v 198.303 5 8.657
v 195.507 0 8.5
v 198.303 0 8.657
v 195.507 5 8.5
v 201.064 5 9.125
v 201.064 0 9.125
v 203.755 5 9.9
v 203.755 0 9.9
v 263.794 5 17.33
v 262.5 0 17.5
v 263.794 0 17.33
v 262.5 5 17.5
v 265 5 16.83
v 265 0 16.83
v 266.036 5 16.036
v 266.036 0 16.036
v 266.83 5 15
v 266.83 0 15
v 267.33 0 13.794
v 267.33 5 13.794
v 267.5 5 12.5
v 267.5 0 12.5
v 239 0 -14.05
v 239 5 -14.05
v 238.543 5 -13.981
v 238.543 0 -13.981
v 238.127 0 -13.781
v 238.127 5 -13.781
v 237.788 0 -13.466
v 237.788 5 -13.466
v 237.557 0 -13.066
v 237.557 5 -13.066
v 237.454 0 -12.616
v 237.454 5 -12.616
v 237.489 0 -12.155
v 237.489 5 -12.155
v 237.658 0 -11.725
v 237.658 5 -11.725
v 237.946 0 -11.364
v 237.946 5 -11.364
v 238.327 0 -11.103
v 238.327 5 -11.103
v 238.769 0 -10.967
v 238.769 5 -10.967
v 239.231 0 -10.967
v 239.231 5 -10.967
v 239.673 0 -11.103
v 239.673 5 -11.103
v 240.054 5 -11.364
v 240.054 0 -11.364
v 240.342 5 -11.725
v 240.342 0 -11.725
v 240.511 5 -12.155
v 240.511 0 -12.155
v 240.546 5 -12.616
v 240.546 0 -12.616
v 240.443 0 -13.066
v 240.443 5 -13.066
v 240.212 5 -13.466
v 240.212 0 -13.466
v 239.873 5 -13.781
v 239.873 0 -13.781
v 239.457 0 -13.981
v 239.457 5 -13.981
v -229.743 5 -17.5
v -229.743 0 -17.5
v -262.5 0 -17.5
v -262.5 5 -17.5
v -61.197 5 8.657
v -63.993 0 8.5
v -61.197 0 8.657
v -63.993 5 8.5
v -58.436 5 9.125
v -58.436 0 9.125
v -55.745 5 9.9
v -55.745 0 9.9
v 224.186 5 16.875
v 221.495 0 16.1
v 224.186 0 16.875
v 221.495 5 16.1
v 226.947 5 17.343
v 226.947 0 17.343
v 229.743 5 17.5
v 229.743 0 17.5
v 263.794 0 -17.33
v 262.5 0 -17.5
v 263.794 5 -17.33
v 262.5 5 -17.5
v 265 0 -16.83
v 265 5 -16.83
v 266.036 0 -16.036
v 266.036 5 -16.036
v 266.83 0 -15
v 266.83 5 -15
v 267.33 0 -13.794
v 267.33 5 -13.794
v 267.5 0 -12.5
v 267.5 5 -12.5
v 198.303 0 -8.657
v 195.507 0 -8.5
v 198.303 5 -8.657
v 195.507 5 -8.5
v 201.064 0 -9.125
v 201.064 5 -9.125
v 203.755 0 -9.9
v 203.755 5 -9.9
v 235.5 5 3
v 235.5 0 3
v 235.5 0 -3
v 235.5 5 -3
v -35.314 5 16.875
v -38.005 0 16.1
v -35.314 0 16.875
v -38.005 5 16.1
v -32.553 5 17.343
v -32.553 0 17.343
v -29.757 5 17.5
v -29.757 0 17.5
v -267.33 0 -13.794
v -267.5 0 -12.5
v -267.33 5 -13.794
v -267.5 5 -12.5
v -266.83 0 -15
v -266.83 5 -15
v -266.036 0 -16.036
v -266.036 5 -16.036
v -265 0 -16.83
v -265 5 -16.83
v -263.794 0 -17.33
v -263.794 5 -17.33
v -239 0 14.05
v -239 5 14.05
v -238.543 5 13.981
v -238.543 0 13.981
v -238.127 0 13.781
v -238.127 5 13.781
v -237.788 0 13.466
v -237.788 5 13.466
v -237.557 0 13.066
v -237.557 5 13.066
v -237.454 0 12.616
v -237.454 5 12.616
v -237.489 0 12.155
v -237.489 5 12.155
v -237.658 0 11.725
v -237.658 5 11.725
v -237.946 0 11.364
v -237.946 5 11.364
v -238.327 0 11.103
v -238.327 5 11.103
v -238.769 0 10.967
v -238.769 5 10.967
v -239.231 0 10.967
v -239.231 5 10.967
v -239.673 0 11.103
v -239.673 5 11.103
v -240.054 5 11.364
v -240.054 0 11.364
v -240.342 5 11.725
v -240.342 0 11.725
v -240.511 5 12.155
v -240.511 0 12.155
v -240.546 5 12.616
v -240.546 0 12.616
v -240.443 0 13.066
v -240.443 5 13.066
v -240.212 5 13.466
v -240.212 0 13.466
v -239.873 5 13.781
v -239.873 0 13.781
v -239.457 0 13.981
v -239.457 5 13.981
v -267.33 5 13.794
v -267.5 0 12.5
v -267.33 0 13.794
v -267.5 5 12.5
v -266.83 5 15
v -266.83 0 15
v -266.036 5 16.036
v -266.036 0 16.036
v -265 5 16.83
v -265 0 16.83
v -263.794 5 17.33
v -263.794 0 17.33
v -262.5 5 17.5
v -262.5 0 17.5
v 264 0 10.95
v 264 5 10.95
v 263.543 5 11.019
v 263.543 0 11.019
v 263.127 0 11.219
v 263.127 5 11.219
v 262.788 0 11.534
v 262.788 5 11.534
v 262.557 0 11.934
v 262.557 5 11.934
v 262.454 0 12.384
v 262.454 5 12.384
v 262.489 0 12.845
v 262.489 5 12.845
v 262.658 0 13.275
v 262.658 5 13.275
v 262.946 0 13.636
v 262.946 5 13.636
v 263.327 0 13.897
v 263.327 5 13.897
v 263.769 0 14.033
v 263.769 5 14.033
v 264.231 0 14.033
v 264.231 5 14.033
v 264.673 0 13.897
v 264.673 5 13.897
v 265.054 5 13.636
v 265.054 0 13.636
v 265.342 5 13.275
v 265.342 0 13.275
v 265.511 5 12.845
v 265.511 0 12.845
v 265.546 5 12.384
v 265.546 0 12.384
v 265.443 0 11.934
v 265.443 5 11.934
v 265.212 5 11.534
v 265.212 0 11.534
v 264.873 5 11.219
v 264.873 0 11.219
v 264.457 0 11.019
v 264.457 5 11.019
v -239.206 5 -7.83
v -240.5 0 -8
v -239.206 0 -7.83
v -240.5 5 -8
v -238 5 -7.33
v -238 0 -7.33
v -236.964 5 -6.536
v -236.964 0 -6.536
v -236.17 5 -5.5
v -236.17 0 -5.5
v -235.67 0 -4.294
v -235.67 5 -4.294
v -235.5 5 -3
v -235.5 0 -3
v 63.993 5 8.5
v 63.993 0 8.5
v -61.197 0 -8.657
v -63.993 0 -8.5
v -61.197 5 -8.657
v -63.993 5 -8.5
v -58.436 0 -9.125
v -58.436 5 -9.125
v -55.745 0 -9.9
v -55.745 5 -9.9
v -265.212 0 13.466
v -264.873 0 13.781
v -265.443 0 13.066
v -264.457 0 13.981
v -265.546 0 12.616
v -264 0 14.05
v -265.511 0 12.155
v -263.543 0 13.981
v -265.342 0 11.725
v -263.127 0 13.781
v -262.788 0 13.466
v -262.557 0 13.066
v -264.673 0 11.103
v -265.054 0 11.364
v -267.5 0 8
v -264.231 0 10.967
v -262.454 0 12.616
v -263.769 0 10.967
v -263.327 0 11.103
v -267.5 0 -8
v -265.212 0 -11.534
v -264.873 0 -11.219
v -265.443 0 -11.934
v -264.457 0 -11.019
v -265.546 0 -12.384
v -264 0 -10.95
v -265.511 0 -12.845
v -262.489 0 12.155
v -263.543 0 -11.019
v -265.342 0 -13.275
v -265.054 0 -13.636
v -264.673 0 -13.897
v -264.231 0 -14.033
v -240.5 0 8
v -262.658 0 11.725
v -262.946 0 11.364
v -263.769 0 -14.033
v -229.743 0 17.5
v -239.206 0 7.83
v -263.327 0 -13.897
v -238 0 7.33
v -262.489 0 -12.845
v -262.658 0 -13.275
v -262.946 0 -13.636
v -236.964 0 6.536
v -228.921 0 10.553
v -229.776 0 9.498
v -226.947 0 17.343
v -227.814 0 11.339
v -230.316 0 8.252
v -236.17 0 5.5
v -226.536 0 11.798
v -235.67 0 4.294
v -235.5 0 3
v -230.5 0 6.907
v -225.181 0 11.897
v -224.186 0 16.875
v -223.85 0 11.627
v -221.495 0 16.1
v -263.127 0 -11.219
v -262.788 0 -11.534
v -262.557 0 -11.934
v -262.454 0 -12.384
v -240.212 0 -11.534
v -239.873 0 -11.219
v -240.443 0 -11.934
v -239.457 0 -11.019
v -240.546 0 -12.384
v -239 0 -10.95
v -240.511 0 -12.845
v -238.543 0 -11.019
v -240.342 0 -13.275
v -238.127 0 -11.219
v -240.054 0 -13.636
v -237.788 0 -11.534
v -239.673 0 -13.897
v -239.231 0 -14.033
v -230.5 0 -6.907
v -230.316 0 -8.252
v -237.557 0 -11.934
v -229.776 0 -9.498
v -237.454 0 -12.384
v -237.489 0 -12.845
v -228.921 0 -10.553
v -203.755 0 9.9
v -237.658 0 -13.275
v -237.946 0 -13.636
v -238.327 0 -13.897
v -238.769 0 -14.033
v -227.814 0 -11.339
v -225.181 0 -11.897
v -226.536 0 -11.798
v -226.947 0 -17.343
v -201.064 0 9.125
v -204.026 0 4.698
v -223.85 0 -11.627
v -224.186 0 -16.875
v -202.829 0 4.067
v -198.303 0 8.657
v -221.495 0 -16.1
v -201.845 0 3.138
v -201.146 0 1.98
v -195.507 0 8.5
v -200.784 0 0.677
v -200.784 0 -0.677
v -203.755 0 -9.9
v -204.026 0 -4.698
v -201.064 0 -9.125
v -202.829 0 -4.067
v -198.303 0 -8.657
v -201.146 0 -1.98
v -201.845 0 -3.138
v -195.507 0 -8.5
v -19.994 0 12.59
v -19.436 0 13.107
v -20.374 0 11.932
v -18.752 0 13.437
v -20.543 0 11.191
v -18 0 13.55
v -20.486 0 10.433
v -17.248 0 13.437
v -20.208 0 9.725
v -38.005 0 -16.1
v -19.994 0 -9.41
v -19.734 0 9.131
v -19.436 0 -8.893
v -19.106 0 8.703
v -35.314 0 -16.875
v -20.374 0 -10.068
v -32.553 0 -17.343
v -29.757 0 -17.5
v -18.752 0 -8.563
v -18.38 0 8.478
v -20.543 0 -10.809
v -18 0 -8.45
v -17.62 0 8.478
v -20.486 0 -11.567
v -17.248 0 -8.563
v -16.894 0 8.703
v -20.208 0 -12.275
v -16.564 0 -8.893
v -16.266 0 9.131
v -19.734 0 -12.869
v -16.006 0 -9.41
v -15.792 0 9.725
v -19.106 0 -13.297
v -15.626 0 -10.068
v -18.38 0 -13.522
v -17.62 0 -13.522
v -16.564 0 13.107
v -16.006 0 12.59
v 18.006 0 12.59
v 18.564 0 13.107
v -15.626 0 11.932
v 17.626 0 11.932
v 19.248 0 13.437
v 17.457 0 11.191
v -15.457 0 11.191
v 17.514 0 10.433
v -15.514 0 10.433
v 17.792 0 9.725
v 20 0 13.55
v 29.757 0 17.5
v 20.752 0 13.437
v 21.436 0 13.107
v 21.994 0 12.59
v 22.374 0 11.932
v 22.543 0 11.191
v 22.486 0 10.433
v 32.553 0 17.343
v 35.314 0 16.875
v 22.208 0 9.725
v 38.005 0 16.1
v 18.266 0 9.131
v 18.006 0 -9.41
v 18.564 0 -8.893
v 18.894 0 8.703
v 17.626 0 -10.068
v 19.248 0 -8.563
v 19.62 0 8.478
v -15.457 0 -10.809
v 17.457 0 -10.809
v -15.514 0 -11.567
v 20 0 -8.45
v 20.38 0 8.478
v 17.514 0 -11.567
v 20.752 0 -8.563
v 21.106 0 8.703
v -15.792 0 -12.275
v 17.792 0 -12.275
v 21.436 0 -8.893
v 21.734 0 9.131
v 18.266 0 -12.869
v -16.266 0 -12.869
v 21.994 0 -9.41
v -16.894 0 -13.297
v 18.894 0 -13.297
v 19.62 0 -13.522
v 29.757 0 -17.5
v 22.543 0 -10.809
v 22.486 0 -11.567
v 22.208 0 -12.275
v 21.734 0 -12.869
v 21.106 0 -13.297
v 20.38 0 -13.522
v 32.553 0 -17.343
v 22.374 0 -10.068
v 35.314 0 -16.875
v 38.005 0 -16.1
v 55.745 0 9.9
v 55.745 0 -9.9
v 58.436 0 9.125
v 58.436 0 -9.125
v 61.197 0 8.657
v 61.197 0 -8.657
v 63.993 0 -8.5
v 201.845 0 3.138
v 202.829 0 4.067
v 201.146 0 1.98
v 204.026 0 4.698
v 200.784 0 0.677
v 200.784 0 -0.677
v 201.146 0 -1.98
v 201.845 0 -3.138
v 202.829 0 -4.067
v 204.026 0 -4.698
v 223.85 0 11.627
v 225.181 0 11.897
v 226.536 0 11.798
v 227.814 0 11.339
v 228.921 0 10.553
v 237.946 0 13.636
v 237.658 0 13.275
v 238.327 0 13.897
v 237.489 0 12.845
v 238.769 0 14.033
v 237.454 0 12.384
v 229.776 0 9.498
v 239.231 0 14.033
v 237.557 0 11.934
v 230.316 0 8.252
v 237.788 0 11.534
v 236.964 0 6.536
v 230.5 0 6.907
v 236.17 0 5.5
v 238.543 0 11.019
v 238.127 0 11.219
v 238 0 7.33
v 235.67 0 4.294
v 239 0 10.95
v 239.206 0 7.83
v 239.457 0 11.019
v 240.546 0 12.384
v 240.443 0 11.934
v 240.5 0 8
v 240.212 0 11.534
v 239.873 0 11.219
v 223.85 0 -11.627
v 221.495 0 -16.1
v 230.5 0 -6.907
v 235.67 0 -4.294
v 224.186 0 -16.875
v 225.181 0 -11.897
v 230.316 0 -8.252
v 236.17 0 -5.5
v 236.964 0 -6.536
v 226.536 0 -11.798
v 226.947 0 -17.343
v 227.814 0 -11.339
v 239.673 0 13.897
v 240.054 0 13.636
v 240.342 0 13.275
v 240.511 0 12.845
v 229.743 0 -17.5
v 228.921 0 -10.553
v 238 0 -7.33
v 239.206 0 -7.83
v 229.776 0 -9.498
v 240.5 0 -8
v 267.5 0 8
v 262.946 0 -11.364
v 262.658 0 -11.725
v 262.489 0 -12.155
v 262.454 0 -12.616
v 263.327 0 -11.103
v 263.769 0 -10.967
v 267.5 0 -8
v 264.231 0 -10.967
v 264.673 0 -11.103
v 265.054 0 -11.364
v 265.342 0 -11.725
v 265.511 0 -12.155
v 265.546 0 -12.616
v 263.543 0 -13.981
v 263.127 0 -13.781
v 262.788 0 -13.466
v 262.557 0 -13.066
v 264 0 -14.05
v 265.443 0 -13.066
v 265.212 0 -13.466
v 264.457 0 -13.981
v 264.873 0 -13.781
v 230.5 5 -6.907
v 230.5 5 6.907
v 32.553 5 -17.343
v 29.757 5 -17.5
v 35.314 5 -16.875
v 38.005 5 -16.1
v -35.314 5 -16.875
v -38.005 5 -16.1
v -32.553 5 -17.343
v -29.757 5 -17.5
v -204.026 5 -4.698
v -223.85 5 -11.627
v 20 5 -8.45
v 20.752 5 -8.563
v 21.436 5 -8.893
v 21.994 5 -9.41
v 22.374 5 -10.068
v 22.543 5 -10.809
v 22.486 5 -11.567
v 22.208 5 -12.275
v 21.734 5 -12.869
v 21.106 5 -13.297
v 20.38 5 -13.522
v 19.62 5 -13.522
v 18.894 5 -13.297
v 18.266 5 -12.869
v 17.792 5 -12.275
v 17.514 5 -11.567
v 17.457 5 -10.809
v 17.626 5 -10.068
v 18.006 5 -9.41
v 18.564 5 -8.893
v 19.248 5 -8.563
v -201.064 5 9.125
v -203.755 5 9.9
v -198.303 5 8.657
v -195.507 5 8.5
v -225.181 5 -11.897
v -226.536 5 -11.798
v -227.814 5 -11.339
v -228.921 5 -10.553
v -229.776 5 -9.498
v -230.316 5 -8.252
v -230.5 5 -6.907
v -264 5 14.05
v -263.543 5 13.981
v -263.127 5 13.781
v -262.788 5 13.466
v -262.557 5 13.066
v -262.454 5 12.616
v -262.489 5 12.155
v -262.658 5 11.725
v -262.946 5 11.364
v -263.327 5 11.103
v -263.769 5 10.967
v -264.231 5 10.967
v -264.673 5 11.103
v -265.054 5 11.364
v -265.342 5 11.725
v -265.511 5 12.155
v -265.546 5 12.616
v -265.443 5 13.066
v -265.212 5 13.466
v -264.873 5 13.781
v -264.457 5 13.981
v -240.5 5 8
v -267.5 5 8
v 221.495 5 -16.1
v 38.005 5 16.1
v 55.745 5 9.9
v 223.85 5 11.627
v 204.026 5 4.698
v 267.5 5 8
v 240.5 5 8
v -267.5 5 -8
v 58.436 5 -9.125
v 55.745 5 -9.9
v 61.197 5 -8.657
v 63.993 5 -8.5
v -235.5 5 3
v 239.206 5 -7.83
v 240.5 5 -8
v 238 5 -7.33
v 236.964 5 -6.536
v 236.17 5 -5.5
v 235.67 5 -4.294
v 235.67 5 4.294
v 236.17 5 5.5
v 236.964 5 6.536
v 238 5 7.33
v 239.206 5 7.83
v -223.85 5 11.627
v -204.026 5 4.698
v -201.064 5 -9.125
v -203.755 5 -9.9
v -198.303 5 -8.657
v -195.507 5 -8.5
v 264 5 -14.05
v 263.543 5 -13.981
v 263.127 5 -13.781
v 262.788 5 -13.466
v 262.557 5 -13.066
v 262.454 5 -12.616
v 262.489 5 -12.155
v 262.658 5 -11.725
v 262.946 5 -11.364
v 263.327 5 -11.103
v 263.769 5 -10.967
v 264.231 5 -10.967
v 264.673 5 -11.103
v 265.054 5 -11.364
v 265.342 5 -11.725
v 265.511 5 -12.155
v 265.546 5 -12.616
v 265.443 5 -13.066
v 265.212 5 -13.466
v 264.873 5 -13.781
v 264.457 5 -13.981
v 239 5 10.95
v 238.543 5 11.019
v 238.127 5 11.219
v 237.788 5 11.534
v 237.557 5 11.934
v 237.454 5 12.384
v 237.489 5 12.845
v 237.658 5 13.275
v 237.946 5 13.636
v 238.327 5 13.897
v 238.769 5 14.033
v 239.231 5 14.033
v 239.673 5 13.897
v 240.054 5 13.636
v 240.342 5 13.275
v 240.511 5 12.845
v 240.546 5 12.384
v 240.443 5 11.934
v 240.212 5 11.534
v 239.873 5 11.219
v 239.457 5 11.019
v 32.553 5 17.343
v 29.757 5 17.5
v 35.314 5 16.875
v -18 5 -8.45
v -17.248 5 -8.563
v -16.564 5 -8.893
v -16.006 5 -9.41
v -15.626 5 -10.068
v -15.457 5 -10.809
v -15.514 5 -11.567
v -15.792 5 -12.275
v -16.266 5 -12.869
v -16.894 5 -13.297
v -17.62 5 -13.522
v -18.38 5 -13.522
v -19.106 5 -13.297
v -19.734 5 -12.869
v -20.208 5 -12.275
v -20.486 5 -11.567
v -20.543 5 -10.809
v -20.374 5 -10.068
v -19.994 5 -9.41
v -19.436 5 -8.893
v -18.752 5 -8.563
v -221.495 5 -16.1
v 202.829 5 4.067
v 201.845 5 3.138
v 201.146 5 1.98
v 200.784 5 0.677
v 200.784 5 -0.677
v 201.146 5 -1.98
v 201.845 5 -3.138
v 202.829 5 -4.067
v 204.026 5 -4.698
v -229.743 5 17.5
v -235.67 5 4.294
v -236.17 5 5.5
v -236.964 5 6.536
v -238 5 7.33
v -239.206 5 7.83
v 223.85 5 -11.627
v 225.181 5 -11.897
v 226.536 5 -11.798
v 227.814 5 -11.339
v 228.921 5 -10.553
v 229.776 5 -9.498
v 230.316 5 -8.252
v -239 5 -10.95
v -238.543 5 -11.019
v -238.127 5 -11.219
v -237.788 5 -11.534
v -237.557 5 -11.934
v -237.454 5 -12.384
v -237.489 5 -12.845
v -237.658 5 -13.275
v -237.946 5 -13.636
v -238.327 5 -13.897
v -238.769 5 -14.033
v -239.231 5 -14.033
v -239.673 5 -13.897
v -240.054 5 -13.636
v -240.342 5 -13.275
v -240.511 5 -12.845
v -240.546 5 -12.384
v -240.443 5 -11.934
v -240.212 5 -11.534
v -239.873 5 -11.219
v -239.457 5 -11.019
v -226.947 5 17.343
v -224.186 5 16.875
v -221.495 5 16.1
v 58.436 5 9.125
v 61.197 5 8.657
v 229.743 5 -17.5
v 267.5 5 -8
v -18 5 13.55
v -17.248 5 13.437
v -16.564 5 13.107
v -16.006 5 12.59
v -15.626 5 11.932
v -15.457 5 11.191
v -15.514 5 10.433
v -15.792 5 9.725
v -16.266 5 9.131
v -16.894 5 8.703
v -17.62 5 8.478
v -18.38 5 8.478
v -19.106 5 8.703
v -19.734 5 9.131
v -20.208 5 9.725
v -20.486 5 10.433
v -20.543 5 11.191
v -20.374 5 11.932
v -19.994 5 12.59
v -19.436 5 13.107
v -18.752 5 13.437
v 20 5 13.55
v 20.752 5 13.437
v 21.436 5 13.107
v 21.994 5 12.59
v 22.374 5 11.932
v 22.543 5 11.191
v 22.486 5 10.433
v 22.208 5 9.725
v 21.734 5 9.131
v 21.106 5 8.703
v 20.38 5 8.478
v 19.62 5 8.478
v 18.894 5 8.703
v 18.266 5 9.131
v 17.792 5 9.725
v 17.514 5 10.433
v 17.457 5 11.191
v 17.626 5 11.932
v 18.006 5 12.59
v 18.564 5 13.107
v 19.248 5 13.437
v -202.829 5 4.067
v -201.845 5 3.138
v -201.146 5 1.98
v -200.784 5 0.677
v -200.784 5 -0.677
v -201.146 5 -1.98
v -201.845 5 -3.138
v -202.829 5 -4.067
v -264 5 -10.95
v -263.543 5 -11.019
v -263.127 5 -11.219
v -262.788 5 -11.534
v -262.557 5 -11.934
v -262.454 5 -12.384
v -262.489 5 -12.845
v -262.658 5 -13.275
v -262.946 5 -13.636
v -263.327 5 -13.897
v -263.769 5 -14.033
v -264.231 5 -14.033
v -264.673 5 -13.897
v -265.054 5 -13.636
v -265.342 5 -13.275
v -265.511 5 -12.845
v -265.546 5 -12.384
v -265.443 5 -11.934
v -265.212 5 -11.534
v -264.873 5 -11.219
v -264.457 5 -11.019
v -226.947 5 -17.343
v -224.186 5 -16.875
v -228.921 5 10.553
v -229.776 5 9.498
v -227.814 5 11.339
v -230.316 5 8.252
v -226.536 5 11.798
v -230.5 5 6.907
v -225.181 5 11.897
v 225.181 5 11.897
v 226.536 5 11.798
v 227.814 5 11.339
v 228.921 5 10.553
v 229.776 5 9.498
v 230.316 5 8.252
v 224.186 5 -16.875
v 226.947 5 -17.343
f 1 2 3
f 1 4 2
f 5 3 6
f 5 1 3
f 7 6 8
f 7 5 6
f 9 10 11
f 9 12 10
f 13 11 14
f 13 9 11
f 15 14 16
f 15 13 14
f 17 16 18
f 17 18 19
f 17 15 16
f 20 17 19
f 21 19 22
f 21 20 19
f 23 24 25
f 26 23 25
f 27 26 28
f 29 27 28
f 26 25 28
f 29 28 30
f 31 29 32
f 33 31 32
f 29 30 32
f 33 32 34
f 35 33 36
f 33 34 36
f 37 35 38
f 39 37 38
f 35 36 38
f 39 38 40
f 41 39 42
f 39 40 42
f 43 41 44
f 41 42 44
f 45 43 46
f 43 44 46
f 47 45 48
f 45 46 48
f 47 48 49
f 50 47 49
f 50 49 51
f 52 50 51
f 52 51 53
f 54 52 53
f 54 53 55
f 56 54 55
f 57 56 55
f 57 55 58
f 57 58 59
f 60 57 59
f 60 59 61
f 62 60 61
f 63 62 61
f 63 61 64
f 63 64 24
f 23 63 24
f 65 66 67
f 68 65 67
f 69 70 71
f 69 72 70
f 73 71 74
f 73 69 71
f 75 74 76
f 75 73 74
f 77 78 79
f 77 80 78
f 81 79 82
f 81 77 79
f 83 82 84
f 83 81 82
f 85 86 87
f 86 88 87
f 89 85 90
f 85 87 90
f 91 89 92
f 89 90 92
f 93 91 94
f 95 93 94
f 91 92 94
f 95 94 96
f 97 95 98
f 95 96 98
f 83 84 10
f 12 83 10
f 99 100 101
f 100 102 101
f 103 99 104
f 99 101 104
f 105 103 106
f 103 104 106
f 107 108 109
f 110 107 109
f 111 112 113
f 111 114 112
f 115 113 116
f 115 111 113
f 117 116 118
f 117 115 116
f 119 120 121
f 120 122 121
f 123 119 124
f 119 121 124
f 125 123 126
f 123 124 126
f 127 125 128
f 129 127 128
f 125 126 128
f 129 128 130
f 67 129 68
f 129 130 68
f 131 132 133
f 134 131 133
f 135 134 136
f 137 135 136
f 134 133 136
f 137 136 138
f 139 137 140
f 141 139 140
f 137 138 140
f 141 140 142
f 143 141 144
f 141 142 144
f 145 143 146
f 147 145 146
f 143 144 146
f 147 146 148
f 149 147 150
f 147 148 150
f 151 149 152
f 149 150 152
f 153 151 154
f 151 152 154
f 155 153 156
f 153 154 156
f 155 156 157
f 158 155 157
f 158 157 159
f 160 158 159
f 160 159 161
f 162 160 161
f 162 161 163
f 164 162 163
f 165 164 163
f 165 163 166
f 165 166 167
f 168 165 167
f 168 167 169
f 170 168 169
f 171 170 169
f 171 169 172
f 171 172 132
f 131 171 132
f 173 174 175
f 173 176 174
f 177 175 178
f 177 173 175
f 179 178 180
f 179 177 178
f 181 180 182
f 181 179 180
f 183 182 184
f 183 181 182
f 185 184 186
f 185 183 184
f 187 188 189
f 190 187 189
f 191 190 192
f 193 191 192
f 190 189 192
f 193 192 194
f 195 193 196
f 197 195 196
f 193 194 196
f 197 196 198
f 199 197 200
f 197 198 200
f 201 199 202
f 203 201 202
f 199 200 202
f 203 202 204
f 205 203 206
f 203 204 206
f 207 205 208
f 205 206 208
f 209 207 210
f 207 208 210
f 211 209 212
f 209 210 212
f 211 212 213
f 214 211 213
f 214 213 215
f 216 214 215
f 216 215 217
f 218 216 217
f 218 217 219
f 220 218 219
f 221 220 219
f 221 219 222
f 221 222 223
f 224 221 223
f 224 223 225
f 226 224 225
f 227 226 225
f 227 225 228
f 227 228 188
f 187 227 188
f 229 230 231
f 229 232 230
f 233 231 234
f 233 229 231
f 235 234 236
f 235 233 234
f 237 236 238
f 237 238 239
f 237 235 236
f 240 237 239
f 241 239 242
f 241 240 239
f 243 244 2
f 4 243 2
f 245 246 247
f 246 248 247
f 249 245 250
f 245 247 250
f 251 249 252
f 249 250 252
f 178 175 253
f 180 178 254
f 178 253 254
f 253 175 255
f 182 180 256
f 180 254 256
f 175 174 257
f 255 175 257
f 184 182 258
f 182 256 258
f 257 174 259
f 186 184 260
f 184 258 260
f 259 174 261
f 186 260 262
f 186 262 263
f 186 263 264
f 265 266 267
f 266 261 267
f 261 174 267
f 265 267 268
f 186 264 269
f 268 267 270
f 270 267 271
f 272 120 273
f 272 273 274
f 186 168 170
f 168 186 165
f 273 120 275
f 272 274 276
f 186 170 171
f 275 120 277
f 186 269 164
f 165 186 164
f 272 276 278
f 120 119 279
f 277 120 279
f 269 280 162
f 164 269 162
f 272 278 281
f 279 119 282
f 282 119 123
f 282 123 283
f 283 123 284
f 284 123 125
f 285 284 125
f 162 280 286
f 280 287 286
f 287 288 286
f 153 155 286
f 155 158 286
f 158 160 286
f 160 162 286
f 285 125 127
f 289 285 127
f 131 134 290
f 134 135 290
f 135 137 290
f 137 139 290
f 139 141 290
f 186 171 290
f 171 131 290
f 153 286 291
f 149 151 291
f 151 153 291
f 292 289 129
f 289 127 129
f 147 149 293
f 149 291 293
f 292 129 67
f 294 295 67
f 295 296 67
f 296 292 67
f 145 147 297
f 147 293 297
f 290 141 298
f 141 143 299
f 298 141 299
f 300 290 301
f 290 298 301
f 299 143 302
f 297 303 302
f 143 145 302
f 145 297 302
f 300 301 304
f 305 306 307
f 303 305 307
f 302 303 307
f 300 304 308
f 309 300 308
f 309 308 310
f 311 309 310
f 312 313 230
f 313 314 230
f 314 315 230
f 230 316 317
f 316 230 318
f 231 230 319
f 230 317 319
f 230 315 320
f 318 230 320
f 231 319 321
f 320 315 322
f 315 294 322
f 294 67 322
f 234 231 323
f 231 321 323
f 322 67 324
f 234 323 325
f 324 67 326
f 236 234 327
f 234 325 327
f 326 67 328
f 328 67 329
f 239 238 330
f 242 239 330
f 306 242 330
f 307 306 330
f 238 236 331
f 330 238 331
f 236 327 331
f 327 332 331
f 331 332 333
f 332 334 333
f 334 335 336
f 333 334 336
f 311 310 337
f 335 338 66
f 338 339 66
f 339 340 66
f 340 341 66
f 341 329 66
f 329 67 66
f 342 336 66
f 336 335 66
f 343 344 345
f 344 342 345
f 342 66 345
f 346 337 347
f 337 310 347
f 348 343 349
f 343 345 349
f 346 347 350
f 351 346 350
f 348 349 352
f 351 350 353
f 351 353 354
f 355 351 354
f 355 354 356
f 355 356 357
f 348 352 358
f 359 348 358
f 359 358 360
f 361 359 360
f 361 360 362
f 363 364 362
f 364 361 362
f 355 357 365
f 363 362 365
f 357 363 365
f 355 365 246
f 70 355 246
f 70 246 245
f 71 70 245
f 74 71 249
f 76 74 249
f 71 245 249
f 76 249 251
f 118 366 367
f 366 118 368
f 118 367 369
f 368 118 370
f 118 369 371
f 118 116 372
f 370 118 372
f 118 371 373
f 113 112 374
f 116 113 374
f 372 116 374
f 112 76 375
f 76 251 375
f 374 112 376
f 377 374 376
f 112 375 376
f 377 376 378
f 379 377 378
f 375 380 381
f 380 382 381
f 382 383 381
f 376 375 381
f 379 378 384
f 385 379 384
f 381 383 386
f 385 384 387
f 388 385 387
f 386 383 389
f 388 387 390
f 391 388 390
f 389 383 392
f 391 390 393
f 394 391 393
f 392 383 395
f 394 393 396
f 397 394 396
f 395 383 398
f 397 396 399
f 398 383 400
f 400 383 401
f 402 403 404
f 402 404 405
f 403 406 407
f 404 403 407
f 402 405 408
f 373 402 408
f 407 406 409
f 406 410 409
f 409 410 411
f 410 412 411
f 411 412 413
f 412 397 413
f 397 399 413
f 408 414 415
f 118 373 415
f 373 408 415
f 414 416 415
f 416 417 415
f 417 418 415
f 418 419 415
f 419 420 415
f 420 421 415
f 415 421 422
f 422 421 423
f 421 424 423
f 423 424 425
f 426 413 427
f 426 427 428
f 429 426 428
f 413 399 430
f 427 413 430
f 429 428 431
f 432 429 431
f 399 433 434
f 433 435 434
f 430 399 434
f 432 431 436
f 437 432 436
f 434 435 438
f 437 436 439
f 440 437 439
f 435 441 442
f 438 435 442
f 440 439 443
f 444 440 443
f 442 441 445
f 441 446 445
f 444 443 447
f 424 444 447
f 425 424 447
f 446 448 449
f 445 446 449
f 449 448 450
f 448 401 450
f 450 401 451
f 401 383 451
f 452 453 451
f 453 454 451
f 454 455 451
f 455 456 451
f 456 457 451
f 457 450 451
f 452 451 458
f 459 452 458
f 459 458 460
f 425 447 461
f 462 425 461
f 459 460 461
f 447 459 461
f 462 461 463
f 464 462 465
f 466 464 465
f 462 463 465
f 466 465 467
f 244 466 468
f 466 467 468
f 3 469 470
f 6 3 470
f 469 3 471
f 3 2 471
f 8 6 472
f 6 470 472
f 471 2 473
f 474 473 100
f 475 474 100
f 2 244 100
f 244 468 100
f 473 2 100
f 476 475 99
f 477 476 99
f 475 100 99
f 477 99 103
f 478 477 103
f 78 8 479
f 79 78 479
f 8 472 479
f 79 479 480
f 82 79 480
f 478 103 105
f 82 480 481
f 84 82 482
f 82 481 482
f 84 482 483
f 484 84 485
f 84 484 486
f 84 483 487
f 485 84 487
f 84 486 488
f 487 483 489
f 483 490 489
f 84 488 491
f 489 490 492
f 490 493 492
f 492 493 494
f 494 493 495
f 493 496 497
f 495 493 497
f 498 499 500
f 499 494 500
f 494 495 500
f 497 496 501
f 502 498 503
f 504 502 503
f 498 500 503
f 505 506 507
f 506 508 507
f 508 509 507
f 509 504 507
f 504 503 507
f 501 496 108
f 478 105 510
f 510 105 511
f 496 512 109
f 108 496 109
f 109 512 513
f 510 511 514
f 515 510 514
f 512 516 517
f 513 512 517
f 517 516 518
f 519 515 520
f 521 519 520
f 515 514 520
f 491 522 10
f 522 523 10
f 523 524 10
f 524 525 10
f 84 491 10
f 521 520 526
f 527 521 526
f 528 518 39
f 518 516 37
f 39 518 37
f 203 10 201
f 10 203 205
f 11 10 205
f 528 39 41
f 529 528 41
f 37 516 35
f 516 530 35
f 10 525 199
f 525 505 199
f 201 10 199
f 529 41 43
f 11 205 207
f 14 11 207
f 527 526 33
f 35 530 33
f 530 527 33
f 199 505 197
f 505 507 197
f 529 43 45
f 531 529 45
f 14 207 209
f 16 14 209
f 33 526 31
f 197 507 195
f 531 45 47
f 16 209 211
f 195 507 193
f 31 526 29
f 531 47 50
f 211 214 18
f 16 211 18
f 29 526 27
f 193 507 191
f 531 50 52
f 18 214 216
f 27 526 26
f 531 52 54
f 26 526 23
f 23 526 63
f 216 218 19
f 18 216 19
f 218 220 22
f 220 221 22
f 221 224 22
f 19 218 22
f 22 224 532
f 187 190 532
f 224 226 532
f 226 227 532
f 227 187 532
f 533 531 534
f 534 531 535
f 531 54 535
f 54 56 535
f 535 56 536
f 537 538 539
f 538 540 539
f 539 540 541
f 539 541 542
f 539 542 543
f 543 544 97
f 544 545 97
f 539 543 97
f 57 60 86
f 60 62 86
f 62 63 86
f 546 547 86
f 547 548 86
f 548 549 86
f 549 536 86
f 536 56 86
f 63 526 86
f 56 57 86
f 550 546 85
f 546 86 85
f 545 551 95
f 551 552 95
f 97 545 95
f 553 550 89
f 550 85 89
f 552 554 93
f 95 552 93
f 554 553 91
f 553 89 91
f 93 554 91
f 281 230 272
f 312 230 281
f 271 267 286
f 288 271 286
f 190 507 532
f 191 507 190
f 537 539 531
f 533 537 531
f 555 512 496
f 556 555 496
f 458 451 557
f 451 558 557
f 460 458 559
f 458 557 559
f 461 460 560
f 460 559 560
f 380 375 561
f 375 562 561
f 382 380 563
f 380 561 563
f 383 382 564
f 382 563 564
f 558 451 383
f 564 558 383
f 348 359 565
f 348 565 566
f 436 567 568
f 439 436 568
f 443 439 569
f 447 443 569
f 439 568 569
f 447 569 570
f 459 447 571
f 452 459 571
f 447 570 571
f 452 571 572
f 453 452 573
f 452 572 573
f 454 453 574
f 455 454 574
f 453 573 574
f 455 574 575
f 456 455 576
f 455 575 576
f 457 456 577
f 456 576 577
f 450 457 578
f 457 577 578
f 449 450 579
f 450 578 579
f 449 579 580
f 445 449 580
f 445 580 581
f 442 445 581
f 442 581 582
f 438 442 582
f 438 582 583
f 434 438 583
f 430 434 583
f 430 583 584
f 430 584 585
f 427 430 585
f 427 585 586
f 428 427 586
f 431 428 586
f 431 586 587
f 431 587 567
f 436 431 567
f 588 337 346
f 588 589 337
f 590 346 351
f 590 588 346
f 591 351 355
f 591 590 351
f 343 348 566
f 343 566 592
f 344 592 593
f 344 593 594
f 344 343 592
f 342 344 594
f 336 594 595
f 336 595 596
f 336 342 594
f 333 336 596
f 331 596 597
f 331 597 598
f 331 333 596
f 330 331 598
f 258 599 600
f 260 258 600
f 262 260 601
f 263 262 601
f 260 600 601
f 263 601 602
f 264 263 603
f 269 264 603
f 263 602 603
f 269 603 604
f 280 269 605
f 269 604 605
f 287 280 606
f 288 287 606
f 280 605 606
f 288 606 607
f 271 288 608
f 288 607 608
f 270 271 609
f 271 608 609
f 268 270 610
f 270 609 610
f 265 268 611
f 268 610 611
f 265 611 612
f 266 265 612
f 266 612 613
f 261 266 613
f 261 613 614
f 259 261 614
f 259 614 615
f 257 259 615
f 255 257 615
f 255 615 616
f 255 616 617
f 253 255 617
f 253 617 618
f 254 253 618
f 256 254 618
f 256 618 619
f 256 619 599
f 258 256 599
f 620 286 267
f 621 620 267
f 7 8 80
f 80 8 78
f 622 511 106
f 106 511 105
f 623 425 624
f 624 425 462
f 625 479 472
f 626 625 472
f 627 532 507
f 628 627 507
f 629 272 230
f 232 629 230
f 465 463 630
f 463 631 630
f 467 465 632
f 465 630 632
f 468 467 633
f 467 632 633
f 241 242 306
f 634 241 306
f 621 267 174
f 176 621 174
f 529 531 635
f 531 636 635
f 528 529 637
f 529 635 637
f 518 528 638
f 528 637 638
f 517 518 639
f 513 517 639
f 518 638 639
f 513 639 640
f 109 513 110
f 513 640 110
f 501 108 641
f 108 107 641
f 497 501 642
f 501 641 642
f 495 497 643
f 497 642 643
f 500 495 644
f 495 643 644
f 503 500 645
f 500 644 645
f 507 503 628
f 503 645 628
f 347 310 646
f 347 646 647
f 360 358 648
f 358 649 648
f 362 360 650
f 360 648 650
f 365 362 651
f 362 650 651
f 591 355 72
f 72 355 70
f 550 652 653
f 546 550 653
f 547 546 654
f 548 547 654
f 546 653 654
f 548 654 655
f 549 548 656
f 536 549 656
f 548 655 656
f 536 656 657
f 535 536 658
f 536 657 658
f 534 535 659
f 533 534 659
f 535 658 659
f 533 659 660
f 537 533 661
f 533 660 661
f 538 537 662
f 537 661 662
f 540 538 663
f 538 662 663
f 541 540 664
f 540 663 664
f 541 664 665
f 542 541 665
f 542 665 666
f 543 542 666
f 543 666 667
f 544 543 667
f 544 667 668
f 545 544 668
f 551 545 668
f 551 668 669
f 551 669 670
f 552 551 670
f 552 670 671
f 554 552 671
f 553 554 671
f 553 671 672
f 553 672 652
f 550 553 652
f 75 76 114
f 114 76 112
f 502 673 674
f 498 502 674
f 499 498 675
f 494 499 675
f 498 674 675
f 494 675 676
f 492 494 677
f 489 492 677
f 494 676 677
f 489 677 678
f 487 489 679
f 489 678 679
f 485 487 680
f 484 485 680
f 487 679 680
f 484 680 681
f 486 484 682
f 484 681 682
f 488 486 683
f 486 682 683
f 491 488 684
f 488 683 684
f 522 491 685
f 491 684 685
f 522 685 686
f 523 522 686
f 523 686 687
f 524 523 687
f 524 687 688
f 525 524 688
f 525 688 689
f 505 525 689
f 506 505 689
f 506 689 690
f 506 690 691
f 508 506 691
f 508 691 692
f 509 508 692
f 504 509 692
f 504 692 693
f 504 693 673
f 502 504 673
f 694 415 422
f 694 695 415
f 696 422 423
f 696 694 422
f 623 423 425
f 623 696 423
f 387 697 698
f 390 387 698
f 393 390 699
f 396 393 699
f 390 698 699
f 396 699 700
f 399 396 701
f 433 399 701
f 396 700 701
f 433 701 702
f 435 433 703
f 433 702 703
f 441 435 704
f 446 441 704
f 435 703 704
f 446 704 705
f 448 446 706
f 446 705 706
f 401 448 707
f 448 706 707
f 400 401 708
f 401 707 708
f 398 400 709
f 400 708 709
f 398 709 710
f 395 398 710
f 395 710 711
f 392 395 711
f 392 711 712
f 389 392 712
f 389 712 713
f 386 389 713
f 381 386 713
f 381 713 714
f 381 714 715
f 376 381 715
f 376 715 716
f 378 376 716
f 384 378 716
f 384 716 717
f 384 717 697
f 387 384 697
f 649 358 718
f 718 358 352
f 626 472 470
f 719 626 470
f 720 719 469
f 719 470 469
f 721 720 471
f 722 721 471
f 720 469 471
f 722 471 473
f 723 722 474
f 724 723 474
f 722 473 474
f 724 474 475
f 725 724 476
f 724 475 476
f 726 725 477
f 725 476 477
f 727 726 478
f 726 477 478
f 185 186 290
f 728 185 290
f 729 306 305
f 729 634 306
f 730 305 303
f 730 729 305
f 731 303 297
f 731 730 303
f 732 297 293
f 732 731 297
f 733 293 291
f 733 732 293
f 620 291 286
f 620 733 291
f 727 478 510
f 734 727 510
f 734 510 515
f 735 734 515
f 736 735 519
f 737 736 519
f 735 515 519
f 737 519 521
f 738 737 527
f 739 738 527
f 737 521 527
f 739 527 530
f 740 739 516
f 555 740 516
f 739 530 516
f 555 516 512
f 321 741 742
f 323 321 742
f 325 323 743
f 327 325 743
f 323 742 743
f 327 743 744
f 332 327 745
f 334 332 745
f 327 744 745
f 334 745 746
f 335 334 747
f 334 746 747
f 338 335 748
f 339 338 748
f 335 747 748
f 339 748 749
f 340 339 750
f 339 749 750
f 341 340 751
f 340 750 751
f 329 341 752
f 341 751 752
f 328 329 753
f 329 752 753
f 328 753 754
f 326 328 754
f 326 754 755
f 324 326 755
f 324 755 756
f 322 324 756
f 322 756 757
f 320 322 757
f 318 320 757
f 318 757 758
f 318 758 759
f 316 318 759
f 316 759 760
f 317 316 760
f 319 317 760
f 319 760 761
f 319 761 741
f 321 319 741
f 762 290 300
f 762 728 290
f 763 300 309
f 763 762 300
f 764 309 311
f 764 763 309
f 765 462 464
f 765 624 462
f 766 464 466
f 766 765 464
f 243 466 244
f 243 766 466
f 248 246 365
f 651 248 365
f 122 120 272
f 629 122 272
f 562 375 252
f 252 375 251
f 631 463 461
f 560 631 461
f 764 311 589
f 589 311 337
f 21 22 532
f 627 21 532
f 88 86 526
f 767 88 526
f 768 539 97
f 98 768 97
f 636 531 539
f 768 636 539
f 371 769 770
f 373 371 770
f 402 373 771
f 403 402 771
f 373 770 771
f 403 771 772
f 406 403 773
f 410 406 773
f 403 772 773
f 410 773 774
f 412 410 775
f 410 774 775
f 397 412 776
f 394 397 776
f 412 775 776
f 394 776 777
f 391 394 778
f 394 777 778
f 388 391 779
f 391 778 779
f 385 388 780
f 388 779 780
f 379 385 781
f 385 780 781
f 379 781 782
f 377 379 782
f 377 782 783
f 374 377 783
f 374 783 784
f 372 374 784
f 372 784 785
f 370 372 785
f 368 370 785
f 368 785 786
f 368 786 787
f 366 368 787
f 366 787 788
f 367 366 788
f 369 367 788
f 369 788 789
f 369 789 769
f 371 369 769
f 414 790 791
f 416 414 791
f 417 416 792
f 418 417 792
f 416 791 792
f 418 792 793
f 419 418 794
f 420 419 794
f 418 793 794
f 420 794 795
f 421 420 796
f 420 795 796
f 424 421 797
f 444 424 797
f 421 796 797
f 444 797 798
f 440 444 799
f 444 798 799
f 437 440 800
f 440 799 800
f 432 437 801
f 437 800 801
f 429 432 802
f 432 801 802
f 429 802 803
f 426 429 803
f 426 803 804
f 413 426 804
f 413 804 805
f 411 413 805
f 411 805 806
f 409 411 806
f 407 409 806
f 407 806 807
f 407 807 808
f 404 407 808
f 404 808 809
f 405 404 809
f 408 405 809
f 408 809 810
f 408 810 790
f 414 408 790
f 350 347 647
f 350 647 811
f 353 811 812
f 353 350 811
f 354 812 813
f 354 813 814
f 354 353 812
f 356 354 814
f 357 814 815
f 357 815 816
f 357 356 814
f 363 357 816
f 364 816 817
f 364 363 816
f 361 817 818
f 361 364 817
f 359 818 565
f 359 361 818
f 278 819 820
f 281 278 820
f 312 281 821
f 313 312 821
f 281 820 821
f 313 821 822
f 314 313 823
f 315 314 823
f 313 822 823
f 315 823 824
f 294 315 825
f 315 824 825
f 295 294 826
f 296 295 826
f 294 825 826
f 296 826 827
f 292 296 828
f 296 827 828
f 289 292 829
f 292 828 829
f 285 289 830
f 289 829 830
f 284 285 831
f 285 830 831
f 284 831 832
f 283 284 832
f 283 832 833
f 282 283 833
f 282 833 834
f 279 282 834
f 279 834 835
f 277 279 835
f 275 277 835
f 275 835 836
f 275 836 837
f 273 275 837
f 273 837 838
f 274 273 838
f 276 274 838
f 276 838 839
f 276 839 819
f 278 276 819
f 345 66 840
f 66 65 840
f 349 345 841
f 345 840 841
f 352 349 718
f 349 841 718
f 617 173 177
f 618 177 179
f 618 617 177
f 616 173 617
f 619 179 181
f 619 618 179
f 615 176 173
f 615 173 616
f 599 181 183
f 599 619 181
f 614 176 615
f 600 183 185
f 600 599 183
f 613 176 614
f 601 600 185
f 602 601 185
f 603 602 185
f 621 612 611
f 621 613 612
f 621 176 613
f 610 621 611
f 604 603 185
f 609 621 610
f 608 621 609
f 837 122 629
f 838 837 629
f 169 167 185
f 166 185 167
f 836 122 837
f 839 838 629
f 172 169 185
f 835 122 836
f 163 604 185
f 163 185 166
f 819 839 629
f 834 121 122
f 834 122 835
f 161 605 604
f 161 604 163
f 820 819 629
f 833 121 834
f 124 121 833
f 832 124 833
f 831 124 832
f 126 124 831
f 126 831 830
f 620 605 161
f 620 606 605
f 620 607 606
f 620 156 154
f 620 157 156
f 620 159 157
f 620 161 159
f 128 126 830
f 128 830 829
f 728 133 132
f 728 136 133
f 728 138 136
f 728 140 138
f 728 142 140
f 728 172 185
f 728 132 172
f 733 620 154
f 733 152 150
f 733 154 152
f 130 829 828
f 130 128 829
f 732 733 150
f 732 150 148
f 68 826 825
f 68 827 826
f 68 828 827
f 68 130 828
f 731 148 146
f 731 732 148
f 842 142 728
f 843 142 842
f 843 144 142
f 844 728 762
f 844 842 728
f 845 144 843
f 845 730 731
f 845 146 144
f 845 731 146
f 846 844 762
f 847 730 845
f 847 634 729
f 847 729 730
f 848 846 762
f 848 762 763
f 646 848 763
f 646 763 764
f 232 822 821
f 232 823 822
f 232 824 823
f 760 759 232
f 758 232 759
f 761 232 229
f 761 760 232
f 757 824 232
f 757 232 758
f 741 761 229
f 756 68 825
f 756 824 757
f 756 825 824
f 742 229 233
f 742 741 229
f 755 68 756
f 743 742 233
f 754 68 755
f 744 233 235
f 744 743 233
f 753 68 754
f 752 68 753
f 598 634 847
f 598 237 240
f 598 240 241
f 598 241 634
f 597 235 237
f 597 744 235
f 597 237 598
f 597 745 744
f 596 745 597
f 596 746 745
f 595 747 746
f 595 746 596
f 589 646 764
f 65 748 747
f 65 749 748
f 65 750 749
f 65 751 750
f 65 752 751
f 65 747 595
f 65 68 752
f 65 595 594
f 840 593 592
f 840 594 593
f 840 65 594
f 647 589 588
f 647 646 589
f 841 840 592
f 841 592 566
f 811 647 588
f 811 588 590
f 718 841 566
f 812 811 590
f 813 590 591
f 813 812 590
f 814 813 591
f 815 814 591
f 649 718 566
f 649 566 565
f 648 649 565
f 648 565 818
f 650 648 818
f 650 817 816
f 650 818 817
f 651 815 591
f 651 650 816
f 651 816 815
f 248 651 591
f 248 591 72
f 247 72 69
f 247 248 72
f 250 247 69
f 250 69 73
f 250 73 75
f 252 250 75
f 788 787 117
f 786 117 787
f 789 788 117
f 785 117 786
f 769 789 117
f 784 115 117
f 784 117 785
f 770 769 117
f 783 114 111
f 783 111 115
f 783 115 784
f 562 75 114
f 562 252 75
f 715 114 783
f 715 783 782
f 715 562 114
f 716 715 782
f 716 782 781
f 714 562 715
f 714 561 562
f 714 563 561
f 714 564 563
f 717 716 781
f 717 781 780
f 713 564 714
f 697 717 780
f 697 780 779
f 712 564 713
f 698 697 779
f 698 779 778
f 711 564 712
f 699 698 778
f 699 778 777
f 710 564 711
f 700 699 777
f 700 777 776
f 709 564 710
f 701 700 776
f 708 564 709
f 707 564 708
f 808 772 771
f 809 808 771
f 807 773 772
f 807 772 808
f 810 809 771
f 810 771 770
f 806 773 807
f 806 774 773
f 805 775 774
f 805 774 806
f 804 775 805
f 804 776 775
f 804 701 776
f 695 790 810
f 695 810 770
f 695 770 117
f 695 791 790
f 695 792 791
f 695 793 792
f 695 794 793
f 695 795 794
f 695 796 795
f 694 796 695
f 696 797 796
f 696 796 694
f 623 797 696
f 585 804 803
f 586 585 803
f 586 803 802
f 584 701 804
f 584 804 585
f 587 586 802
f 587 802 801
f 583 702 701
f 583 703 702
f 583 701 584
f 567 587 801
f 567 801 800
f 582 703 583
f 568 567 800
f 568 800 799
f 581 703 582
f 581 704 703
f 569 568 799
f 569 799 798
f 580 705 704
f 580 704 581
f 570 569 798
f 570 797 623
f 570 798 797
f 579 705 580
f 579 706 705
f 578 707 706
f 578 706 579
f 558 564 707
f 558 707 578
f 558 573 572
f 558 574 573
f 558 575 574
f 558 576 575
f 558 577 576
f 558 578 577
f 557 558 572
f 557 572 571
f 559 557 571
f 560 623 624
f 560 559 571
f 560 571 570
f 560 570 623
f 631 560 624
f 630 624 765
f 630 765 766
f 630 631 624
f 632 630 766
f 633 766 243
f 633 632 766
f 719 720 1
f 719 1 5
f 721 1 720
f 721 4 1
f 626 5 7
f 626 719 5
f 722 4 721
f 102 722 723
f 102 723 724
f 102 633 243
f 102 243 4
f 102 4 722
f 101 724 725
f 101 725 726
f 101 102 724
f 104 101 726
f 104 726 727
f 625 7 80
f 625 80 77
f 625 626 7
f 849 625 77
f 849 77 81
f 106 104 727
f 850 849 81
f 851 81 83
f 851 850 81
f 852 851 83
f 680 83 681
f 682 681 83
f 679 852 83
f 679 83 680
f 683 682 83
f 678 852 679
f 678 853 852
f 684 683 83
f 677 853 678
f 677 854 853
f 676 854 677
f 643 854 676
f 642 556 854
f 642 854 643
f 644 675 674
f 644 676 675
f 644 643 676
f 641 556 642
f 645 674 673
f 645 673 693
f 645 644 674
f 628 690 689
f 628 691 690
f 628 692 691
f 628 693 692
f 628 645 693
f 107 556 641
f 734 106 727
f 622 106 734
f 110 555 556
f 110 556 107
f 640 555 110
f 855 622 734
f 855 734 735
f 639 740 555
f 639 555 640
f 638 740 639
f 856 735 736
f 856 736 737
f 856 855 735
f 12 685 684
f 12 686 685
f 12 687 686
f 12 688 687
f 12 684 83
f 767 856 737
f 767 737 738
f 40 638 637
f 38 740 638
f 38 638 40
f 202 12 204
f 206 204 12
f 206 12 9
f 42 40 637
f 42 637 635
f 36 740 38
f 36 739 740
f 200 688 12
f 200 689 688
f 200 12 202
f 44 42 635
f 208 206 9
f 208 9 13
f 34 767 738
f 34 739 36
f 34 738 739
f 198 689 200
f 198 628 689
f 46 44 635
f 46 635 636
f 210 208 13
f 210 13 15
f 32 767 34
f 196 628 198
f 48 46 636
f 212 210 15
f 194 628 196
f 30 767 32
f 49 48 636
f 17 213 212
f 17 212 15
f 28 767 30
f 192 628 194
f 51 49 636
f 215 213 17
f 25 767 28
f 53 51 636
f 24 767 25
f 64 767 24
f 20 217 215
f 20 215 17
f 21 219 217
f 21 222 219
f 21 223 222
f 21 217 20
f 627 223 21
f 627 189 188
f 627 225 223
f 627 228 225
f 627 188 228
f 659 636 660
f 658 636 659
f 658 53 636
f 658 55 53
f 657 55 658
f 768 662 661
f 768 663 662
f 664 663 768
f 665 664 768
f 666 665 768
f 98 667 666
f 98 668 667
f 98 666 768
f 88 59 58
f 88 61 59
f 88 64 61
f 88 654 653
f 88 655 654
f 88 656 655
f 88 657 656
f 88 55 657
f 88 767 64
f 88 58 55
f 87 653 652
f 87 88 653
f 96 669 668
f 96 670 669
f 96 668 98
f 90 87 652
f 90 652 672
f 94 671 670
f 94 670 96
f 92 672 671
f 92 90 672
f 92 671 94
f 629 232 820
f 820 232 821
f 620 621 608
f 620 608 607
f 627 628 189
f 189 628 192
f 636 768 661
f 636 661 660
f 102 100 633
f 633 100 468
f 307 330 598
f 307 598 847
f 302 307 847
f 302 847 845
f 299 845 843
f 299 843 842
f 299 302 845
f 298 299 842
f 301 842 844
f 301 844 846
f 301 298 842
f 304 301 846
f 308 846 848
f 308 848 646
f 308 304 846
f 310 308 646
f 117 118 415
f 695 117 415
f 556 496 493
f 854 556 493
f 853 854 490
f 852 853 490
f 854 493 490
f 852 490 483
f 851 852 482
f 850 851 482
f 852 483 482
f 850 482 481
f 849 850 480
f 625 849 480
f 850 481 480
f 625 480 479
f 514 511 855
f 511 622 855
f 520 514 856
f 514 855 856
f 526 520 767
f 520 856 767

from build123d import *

# Parameters (mm, degrees)
SALIENTE_EXTRUIR1_DEPTH = 5
REDONDEO1_R             = 5
CROQUIS3_R              = 1.55
CROQUIS3_R_2            = 2.55
CORTAR_EXTRUIR1_DEPTH   = 269.118443976
REDONDEO3_R             = 25


with BuildPart() as part:
    # Croquis2 → Saliente-Extruir1 (new body)
    with BuildSketch(Plane(origin=(0, 0, 0), x_dir=(1, 0, 0), z_dir=(0, 1, 0))):
        Polygon((-267.5, 8), (-235.5, 8), (-235.5, -8), (-267.5, -8), (-267.5, -17.5), (-225.5, -17.5), (-199.75, -8.5), (-59.75, -8.5), (-34, -17.5), (34, -17.5), (59.75, -8.5), (199.75, -8.5), (225.5, -17.5), (267.5, -17.5), (267.5, -8), (235.5, -8), (235.5, 8), (267.5, 8), (267.5, 17.5), (225.5, 17.5), (199.75, 8.5), (59.75, 8.5), (34, 17.5), (-34, 17.5), (-59.75, 8.5), (-199.75, 8.5), (-225.5, 17.5), (-267.5, 17.5), align=None)
        with BuildLine():
            Line((-204.02626503, 4.698013204), (-223.850289247, 11.626798368))
            ThreePointArc((-223.850289247, 11.626798368), (-228.394084159, 10.984080534), (-230.5, 6.906792602))
            Line((-230.5, 6.906792602), (-230.5, -6.906792602))
            ThreePointArc((-230.5, -6.906792602), (-228.394084159, -10.984080534), (-223.850289247, -11.626798368))
            Line((-223.850289247, -11.626798368), (-204.02626503, -4.698013204))
            ThreePointArc((-204.02626503, -4.698013204), (-200.737601329, 0), (-204.02626503, 4.698013204))
        make_face(mode=Mode.SUBTRACT)
        with BuildLine():
            Line((204.02626503, 4.698013204), (223.850289247, 11.626798368))
            ThreePointArc((223.850289247, 11.626798368), (228.394084159, 10.984080534), (230.5, 6.906792602))
            Line((230.5, 6.906792602), (230.5, -6.906792602))
            ThreePointArc((230.5, -6.906792602), (228.394084159, -10.984080534), (223.850289247, -11.626798368))
            Line((223.850289247, -11.626798368), (204.02626503, -4.698013204))
            ThreePointArc((204.02626503, -4.698013204), (200.737601329, 0), (204.02626503, 4.698013204))
        make_face(mode=Mode.SUBTRACT)
    extrude(amount=SALIENTE_EXTRUIR1_DEPTH)

    # Redondeo1
    redondeo1_edges = [part.edges().sort_by_distance(p)[0] for p in [
        (235.5, 2.5, -8),
        (235.5, 2.5, 8),
        (267.5, 2.5, 17.5),
        (-267.5, 2.5, 17.5),
        (-235.5, 2.5, 8),
        (-235.5, 2.5, -8),
        (-267.5, 2.5, -17.5),
        (267.5, 2.5, -17.5),
    ]]
    fillet(redondeo1_edges, radius=REDONDEO1_R)

    # Croquis3 → Cortar-Extruir1 (cut, through all)
    with BuildSketch(Plane(origin=(0, 5, 0), x_dir=(1, 0, 0), z_dir=(0, 1, 0))):
        with Locations(Location((-264, -12.5, 0), (0, 0, 270))):
            Circle(CROQUIS3_R)
        with Locations(Location((-239, -12.5, 0), (0, 0, 270))):
            Circle(CROQUIS3_R)
        with Locations(Location((-239, 12.5, 0), (0, 0, 270))):
            Circle(CROQUIS3_R)
        with Locations(Location((-264, 12.5, 0), (0, 0, 270))):
            Circle(CROQUIS3_R)
        with Locations(Location((264, 12.5, 0), (0, 0, 90))):
            Circle(CROQUIS3_R)
        with Locations(Location((239, 12.5, 0), (0, 0, 90))):
            Circle(CROQUIS3_R)
        with Locations(Location((239, -12.5, 0), (0, 0, 90))):
            Circle(CROQUIS3_R)
        with Locations(Location((264, -12.5, 0), (0, 0, 90))):
            Circle(CROQUIS3_R)
        with Locations(Location((-18, -11, 0), (0, 0, 270))):
            Circle(CROQUIS3_R_2)
        with Locations(Location((20, -11, 0), (0, 0, 270))):
            Circle(CROQUIS3_R_2)
        with Locations(Location((20, 11, 0), (0, 0, 270))):
            Circle(CROQUIS3_R_2)
        with Locations(Location((-18, 11, 0), (0, 0, 270))):
            Circle(CROQUIS3_R_2)
    extrude(amount=-CORTAR_EXTRUIR1_DEPTH, mode=Mode.SUBTRACT)

    # Redondeo3
    redondeo3_edges = [part.edges().sort_by_distance(p)[0] for p in [
        (225.5, 2.5, 17.5),
        (199.75, 2.5, 8.5),
        (59.75, 2.5, 8.5),
        (34, 2.5, 17.5),
        (-34, 2.5, 17.5),
        (-59.75, 2.5, 8.5),
        (-199.75, 2.5, 8.5),
        (-225.5, 2.5, 17.5),
        (-225.5, 2.5, -17.5),
        (-199.75, 2.5, -8.5),
        (-59.75, 2.5, -8.5),
        (-34, 2.5, -17.5),
        (34, 2.5, -17.5),
        (59.75, 2.5, -8.5),
        (199.75, 2.5, -8.5),
        (225.5, 2.5, -17.5),
    ]]
    fillet(redondeo3_edges, radius=REDONDEO3_R)


solid = part.part
